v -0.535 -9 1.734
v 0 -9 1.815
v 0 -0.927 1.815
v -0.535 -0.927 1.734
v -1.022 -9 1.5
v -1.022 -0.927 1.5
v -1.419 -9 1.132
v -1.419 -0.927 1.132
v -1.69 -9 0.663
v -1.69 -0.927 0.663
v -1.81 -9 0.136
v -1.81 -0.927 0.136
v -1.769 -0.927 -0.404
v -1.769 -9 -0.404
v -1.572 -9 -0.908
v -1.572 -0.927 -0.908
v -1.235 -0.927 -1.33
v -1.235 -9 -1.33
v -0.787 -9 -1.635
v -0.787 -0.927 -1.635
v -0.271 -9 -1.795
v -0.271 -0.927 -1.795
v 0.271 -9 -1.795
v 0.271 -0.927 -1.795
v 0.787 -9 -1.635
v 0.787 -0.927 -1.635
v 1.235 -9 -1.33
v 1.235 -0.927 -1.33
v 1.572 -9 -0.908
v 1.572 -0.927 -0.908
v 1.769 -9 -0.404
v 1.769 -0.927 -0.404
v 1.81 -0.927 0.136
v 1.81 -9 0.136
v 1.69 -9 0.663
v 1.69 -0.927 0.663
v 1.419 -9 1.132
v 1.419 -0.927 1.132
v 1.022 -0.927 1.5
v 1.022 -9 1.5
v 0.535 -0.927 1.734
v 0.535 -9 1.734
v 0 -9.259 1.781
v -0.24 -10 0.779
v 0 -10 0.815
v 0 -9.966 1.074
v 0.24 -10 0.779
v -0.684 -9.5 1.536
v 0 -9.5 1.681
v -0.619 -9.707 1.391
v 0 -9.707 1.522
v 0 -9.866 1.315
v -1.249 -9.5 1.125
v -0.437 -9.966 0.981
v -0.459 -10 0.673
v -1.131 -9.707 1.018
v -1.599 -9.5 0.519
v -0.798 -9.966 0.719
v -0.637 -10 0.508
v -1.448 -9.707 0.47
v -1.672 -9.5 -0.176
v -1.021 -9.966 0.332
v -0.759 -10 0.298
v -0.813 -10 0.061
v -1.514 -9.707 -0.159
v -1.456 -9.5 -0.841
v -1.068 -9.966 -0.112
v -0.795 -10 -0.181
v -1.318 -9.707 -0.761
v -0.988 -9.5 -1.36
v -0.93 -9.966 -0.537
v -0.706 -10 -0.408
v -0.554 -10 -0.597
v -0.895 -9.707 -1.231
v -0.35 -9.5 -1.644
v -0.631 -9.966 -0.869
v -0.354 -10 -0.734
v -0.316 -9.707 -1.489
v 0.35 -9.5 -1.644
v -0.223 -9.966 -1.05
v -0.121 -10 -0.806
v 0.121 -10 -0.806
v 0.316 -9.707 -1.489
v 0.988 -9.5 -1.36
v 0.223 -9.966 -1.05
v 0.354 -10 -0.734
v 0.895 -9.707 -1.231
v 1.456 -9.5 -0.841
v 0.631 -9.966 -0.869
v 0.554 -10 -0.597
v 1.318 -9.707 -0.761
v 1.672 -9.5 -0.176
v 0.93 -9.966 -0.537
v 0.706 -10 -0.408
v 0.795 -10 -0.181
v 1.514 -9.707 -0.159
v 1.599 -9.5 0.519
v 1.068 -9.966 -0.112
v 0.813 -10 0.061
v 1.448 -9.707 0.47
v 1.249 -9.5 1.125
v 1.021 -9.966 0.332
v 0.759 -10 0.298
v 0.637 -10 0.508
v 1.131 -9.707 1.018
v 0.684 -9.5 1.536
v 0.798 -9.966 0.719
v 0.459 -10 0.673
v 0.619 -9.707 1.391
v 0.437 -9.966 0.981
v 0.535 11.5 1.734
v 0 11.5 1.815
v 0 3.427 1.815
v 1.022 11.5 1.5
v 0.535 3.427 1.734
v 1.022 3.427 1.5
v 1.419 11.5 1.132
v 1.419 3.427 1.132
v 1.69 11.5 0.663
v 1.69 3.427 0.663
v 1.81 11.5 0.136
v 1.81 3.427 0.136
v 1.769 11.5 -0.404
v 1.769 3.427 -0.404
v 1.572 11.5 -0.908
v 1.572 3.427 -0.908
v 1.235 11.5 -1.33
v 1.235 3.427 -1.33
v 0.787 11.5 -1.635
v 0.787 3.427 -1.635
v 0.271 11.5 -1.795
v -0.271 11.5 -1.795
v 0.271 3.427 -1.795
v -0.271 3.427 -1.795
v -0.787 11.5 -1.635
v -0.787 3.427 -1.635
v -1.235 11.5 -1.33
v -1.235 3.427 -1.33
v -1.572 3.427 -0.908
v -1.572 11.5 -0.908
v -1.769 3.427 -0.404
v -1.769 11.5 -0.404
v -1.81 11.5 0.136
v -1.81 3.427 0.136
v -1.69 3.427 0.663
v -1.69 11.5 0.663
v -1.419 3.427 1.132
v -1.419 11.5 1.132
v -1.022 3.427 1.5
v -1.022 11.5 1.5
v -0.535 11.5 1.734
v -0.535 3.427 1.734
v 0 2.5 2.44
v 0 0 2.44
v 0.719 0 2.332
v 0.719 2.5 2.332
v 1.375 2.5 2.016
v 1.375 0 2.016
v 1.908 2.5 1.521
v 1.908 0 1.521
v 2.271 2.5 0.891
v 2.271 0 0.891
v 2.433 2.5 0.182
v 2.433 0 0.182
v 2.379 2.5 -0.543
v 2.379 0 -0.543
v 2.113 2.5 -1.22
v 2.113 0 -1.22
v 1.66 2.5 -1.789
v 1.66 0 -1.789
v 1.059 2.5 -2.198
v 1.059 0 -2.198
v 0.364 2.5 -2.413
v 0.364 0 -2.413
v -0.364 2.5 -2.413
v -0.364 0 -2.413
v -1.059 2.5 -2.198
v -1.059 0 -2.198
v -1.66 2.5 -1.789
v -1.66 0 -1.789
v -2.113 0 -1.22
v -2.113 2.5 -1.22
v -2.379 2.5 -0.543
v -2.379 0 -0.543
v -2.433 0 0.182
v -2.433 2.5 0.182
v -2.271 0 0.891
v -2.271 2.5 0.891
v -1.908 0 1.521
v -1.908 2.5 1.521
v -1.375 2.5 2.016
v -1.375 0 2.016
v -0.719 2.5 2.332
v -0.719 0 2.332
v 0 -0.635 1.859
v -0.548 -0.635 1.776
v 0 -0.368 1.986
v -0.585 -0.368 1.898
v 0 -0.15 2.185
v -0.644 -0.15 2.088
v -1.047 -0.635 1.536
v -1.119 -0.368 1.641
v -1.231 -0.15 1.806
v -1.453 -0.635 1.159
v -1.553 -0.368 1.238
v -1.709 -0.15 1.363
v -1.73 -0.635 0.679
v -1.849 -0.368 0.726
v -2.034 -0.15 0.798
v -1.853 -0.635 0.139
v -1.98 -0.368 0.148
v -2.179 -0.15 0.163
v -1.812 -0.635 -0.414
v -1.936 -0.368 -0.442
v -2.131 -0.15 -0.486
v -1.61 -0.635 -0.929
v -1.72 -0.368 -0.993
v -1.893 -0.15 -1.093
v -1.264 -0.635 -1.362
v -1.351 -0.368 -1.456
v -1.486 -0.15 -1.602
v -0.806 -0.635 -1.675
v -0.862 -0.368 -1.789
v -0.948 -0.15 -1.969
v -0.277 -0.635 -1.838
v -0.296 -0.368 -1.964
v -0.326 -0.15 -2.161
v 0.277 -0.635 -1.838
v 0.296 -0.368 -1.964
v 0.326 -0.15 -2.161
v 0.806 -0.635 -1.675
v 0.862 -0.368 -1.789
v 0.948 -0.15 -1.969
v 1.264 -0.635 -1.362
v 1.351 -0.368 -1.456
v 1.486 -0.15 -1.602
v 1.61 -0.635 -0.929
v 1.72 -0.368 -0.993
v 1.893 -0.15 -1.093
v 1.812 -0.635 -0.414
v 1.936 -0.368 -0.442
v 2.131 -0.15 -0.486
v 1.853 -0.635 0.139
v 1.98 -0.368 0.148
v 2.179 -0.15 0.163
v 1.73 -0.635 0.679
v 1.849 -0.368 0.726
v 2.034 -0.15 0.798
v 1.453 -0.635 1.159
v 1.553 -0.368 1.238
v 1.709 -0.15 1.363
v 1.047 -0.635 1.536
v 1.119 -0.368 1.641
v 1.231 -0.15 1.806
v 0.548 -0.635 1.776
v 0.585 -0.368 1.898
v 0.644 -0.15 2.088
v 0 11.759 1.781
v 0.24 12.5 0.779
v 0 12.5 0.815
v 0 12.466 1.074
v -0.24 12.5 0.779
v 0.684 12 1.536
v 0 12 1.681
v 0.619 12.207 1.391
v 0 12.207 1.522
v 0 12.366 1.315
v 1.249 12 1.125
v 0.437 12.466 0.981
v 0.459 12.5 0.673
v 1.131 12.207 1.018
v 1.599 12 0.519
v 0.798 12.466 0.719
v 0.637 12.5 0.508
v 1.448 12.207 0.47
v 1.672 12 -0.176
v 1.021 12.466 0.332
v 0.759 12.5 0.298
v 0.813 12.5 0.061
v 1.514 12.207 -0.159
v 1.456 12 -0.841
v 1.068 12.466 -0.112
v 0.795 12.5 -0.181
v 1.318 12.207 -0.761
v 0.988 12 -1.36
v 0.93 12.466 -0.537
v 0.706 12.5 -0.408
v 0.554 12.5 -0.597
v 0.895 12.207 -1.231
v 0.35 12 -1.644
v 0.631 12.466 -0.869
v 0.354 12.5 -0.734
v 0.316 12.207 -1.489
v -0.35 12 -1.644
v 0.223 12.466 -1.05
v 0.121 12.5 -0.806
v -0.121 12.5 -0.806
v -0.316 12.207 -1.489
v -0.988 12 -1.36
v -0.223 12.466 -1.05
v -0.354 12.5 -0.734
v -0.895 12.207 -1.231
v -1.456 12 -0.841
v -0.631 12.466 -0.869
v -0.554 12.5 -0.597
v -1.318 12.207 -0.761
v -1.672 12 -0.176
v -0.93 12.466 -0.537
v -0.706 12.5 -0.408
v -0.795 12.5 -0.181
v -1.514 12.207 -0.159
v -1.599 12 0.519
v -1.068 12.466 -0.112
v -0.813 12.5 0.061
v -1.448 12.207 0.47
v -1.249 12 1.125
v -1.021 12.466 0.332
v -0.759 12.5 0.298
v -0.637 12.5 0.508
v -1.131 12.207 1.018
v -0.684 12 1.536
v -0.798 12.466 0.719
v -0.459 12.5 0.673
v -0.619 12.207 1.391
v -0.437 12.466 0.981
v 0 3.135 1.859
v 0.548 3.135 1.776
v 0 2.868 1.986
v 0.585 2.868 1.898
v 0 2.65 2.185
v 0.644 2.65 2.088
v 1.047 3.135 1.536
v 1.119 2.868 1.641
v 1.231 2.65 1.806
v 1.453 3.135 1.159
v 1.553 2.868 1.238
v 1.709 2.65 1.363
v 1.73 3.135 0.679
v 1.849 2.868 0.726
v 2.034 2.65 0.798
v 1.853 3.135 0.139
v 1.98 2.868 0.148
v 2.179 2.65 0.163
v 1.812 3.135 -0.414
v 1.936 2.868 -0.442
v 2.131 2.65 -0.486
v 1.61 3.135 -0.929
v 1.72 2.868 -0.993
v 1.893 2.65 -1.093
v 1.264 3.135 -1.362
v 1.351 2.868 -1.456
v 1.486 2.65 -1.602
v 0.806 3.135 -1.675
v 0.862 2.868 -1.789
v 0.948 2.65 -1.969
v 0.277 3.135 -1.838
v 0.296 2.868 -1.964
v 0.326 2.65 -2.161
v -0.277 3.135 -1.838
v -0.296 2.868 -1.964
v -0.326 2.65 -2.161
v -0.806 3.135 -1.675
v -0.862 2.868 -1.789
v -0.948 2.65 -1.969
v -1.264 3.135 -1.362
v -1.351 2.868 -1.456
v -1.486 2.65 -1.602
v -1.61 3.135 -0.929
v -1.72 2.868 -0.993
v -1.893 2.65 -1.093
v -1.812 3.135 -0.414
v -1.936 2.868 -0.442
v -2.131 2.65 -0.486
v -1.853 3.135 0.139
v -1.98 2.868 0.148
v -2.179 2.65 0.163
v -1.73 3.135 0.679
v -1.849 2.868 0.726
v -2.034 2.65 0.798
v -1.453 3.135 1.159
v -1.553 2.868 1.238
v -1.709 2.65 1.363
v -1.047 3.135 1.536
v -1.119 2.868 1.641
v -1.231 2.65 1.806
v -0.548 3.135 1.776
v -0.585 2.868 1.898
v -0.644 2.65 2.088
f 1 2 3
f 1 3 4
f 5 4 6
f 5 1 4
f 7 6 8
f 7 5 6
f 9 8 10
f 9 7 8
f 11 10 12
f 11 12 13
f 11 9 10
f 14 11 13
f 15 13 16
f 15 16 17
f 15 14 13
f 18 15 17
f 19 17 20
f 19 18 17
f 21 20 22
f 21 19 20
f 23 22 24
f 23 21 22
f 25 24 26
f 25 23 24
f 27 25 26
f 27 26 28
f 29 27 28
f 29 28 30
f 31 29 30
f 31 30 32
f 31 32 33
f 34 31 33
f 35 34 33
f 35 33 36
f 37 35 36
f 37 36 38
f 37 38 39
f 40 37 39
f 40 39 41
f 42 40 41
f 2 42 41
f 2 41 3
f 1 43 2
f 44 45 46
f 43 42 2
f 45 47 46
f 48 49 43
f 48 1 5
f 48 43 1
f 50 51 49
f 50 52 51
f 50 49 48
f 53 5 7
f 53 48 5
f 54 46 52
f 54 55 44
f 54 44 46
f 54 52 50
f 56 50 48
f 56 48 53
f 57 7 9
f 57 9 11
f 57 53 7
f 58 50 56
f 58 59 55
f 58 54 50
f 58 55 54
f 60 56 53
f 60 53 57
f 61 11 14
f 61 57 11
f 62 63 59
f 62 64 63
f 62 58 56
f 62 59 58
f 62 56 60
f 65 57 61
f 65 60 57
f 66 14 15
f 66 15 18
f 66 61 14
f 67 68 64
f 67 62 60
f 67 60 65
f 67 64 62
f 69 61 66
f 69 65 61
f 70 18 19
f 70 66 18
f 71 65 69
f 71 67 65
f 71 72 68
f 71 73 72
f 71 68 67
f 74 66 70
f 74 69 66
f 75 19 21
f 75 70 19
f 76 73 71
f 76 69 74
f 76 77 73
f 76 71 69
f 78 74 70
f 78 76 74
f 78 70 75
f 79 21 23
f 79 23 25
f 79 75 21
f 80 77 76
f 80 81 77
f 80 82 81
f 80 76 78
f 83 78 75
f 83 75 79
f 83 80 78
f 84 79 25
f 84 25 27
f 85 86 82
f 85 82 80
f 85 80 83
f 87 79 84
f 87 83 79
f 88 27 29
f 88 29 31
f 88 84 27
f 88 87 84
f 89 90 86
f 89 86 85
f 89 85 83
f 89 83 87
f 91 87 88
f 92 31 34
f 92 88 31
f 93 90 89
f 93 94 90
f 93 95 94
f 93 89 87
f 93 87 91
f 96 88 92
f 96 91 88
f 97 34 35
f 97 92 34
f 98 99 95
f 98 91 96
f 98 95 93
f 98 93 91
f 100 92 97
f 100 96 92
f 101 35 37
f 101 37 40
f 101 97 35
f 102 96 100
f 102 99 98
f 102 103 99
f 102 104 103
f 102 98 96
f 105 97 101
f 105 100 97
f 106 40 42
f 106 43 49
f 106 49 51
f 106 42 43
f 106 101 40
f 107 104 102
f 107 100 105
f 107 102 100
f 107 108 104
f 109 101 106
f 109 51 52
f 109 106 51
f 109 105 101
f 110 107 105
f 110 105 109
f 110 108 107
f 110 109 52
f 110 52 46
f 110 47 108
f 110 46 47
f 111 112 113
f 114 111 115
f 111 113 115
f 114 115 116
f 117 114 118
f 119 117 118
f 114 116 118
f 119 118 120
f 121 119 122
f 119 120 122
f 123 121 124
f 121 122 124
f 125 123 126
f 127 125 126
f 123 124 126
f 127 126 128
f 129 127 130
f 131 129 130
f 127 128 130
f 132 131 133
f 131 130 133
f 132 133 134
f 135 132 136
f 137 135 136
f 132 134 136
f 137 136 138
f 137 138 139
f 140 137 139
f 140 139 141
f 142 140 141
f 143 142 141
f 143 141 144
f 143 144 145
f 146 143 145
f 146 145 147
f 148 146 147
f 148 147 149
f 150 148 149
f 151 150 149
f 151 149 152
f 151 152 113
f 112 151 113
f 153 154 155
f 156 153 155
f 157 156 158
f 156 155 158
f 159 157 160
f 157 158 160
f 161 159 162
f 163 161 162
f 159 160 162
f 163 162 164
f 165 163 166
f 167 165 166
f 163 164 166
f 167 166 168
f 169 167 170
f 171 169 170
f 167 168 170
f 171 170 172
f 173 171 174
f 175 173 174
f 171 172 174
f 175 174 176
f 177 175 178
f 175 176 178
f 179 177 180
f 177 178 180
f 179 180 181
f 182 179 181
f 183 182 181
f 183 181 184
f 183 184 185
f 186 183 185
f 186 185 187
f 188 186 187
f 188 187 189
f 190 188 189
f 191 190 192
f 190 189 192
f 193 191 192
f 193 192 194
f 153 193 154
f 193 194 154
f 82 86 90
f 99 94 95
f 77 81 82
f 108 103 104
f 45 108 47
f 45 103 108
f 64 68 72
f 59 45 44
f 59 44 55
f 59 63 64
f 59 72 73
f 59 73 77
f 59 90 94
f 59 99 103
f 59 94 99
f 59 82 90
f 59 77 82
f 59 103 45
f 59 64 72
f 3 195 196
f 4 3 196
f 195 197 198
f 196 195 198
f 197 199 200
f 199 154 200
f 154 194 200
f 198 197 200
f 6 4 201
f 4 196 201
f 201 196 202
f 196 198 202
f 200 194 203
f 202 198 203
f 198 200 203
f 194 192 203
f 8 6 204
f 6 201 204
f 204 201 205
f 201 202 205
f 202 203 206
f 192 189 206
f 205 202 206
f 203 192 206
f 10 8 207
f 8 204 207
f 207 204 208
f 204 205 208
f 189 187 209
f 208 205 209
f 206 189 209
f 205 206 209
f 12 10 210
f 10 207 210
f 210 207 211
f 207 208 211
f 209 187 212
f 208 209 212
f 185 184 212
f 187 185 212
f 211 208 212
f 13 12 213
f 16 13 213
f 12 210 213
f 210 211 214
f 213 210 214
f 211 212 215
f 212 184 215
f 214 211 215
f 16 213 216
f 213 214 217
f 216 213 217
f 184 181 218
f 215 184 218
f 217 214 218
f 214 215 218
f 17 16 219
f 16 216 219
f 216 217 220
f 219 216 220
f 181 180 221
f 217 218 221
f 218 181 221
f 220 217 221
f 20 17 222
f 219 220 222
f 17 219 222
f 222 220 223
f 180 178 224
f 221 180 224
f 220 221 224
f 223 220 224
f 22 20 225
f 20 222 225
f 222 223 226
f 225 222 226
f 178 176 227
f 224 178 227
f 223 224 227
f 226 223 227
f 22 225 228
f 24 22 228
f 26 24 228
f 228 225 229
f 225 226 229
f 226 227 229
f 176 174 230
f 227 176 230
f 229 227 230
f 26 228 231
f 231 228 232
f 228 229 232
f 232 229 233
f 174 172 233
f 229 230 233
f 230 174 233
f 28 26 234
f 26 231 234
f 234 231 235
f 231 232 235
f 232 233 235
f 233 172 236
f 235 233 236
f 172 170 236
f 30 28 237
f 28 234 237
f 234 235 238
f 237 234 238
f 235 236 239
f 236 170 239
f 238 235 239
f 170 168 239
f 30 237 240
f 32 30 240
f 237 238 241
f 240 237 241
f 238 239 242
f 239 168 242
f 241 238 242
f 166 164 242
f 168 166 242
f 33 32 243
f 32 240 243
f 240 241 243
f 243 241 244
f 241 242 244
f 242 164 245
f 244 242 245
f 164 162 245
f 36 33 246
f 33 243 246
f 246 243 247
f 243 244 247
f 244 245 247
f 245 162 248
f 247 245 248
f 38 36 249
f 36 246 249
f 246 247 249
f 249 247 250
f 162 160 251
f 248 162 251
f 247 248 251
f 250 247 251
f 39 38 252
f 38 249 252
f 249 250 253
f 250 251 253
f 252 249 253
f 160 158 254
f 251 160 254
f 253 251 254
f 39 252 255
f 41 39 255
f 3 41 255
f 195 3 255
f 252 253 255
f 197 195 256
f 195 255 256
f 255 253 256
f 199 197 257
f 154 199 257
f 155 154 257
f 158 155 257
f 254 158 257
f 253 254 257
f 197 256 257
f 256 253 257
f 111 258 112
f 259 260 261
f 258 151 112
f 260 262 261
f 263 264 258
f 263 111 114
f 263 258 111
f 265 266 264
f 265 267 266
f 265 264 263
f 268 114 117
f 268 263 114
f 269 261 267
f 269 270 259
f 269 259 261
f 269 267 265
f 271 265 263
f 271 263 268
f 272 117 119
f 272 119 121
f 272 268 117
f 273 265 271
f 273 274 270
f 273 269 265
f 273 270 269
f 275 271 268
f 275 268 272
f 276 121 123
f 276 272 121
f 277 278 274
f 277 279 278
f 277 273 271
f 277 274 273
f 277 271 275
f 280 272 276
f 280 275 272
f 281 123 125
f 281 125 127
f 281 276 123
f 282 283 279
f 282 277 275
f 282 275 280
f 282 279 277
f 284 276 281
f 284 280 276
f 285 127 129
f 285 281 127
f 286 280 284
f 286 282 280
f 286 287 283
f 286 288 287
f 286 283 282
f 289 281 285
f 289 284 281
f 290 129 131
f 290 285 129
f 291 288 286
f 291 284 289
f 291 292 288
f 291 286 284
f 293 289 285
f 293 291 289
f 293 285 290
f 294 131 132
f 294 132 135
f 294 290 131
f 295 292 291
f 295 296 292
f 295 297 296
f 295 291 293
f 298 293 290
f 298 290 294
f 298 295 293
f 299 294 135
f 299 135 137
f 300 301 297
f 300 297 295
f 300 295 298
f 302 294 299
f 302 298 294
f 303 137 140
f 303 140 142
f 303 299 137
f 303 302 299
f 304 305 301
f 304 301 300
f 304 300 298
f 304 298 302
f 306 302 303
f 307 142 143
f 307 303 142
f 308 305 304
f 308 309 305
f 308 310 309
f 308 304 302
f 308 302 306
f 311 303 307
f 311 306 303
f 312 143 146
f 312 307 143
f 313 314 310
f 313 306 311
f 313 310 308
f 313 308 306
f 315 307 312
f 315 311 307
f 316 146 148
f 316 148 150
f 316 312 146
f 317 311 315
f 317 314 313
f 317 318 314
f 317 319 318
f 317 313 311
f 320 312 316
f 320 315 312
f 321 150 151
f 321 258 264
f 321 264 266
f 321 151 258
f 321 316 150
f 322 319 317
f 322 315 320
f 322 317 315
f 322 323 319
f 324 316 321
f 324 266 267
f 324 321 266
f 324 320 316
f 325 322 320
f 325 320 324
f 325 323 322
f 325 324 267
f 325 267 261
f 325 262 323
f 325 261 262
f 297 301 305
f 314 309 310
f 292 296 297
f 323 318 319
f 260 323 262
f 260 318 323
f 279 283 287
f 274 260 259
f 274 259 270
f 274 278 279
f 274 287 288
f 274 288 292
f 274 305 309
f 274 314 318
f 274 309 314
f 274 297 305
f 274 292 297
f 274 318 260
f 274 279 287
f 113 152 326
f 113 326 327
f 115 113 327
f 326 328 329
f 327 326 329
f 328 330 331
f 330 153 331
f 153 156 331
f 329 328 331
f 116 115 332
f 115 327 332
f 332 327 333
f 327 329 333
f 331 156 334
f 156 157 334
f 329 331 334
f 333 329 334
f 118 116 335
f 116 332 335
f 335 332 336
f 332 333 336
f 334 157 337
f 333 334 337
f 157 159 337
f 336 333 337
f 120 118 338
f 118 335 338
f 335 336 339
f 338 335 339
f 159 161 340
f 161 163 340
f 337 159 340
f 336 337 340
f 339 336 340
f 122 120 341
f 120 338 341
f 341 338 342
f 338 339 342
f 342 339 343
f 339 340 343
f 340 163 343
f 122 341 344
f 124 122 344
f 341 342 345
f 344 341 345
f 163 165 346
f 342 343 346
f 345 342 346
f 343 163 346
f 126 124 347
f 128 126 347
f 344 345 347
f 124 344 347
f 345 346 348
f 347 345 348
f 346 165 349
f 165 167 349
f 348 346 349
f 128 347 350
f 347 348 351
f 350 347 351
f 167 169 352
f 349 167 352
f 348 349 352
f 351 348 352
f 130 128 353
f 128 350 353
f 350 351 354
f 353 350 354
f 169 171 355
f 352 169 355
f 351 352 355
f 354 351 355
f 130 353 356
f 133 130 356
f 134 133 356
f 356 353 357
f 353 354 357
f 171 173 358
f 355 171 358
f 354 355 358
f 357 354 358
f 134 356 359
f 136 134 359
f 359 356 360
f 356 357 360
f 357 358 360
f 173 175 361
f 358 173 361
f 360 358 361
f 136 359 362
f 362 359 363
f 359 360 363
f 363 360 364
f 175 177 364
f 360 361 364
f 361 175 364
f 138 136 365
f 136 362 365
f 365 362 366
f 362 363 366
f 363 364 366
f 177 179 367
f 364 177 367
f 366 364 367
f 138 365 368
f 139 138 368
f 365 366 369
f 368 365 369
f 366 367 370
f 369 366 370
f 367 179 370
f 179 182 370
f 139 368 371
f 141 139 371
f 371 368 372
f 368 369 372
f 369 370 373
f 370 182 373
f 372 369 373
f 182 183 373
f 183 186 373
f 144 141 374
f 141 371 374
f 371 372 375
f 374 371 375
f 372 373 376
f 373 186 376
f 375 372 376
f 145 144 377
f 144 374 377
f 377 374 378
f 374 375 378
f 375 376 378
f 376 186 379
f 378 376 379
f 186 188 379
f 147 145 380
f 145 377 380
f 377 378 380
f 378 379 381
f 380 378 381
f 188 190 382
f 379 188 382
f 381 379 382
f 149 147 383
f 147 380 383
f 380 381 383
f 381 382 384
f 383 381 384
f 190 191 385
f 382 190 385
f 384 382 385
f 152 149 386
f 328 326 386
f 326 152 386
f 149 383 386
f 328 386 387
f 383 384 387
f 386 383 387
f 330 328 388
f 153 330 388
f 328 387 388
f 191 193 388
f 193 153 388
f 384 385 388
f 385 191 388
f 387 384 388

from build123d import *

# Parameters (mm, degrees)
CROQUIS1_R              = 2.44
SALIENTE_EXTRUIR1_DEPTH = 2.5
CROQUIS2_R              = 1.815
SALIENTE_EXTRUIR2_DEPTH = 10
SALIENTE_EXTRUIR3_START = 10
CROQUIS3_R              = 1.815
SALIENTE_EXTRUIR3_DEPTH = 10
REDONDEO1_R             = 1
REDONDEO2_R             = 1


with BuildPart() as part:
    # Croquis1 → Saliente-Extruir1 (new body)
    with BuildSketch(Plane(origin=(0, 0, 0), x_dir=(1, 0, 0), z_dir=(0, 1, 0))):
        with Locations(Location((0, 0, 0), (0, 0, 270))):
            Circle(CROQUIS1_R)
    extrude(amount=SALIENTE_EXTRUIR1_DEPTH)

    # Croquis2 → Saliente-Extruir2 (add)
    with BuildSketch(Plane(origin=(0, 2.5, 0), x_dir=(1, 0, 0), z_dir=(0, 1, 0))):
        with Locations(Location((0, 0, 0), (0, 0, 270))):
            Circle(CROQUIS2_R)
    extrude(amount=SALIENTE_EXTRUIR2_DEPTH)

    # Croquis3 → Saliente-Extruir3 (add)
    with BuildSketch(Plane.XZ.offset(SALIENTE_EXTRUIR3_START)):
        with Locations(Location((0, 0, 0), (0, 0, 90))):
            Circle(CROQUIS3_R)
    extrude(amount=-SALIENTE_EXTRUIR3_DEPTH)

    # Redondeo1
    # the kernel refuses this fillet: 1 mm, written as the material it adds along each edge
    with BuildSketch(Plane(origin=(0, 0, 0), x_dir=(0, 0, 1), z_dir=(1, 0, 0))) as redondeo1_piece_1:
        with BuildLine():
            CenterArc((2.815, 0.927024811), REDONDEO1_R, 180, 67.975687163)
            Line((1.815, 0.927024811), (1.795, 0.927024811))
            Line((1.795, 0.927024811), (1.795, 0))
            Line((1.795, 0), (1.815, -0.02))
            ThreePointArc((1.815, -0.02), (2.1275, -0.02), (2.4325, -0.018540496))
            Line((2.4325, -0.018540496), (2.44, 0))
        make_face()
    revolve(axis=Axis((0, 0, 0), (0, -1, 0)))
    with BuildSketch(Plane(origin=(0, 2.5, 0), x_dir=(0, 0, 1), z_dir=(-1, 0, 0))) as redondeo1_piece_2:
        with BuildLine():
            CenterArc((2.815, 0.927024811), REDONDEO1_R, 180, 67.975687163)
            Line((1.815, 0.927024811), (1.795, 0.927024811))
            Line((1.795, 0.927024811), (1.795, 0))
            Line((1.795, 0), (1.815, -0.02))
            ThreePointArc((1.815, -0.02), (2.1275, -0.02), (2.4325, -0.018540496))
            Line((2.4325, -0.018540496), (2.44, 0))
        make_face()
    revolve(axis=Axis((0, 2.5, 0), (0, 1, 0)))

    # Redondeo2
    redondeo2_edges = [part.edges().sort_by_distance(p)[0] for p in [
        (0, -10, -1.815),
        (0, 12.5, -1.815),
    ]]
    fillet(redondeo2_edges, radius=REDONDEO2_R)


solid = part.part
